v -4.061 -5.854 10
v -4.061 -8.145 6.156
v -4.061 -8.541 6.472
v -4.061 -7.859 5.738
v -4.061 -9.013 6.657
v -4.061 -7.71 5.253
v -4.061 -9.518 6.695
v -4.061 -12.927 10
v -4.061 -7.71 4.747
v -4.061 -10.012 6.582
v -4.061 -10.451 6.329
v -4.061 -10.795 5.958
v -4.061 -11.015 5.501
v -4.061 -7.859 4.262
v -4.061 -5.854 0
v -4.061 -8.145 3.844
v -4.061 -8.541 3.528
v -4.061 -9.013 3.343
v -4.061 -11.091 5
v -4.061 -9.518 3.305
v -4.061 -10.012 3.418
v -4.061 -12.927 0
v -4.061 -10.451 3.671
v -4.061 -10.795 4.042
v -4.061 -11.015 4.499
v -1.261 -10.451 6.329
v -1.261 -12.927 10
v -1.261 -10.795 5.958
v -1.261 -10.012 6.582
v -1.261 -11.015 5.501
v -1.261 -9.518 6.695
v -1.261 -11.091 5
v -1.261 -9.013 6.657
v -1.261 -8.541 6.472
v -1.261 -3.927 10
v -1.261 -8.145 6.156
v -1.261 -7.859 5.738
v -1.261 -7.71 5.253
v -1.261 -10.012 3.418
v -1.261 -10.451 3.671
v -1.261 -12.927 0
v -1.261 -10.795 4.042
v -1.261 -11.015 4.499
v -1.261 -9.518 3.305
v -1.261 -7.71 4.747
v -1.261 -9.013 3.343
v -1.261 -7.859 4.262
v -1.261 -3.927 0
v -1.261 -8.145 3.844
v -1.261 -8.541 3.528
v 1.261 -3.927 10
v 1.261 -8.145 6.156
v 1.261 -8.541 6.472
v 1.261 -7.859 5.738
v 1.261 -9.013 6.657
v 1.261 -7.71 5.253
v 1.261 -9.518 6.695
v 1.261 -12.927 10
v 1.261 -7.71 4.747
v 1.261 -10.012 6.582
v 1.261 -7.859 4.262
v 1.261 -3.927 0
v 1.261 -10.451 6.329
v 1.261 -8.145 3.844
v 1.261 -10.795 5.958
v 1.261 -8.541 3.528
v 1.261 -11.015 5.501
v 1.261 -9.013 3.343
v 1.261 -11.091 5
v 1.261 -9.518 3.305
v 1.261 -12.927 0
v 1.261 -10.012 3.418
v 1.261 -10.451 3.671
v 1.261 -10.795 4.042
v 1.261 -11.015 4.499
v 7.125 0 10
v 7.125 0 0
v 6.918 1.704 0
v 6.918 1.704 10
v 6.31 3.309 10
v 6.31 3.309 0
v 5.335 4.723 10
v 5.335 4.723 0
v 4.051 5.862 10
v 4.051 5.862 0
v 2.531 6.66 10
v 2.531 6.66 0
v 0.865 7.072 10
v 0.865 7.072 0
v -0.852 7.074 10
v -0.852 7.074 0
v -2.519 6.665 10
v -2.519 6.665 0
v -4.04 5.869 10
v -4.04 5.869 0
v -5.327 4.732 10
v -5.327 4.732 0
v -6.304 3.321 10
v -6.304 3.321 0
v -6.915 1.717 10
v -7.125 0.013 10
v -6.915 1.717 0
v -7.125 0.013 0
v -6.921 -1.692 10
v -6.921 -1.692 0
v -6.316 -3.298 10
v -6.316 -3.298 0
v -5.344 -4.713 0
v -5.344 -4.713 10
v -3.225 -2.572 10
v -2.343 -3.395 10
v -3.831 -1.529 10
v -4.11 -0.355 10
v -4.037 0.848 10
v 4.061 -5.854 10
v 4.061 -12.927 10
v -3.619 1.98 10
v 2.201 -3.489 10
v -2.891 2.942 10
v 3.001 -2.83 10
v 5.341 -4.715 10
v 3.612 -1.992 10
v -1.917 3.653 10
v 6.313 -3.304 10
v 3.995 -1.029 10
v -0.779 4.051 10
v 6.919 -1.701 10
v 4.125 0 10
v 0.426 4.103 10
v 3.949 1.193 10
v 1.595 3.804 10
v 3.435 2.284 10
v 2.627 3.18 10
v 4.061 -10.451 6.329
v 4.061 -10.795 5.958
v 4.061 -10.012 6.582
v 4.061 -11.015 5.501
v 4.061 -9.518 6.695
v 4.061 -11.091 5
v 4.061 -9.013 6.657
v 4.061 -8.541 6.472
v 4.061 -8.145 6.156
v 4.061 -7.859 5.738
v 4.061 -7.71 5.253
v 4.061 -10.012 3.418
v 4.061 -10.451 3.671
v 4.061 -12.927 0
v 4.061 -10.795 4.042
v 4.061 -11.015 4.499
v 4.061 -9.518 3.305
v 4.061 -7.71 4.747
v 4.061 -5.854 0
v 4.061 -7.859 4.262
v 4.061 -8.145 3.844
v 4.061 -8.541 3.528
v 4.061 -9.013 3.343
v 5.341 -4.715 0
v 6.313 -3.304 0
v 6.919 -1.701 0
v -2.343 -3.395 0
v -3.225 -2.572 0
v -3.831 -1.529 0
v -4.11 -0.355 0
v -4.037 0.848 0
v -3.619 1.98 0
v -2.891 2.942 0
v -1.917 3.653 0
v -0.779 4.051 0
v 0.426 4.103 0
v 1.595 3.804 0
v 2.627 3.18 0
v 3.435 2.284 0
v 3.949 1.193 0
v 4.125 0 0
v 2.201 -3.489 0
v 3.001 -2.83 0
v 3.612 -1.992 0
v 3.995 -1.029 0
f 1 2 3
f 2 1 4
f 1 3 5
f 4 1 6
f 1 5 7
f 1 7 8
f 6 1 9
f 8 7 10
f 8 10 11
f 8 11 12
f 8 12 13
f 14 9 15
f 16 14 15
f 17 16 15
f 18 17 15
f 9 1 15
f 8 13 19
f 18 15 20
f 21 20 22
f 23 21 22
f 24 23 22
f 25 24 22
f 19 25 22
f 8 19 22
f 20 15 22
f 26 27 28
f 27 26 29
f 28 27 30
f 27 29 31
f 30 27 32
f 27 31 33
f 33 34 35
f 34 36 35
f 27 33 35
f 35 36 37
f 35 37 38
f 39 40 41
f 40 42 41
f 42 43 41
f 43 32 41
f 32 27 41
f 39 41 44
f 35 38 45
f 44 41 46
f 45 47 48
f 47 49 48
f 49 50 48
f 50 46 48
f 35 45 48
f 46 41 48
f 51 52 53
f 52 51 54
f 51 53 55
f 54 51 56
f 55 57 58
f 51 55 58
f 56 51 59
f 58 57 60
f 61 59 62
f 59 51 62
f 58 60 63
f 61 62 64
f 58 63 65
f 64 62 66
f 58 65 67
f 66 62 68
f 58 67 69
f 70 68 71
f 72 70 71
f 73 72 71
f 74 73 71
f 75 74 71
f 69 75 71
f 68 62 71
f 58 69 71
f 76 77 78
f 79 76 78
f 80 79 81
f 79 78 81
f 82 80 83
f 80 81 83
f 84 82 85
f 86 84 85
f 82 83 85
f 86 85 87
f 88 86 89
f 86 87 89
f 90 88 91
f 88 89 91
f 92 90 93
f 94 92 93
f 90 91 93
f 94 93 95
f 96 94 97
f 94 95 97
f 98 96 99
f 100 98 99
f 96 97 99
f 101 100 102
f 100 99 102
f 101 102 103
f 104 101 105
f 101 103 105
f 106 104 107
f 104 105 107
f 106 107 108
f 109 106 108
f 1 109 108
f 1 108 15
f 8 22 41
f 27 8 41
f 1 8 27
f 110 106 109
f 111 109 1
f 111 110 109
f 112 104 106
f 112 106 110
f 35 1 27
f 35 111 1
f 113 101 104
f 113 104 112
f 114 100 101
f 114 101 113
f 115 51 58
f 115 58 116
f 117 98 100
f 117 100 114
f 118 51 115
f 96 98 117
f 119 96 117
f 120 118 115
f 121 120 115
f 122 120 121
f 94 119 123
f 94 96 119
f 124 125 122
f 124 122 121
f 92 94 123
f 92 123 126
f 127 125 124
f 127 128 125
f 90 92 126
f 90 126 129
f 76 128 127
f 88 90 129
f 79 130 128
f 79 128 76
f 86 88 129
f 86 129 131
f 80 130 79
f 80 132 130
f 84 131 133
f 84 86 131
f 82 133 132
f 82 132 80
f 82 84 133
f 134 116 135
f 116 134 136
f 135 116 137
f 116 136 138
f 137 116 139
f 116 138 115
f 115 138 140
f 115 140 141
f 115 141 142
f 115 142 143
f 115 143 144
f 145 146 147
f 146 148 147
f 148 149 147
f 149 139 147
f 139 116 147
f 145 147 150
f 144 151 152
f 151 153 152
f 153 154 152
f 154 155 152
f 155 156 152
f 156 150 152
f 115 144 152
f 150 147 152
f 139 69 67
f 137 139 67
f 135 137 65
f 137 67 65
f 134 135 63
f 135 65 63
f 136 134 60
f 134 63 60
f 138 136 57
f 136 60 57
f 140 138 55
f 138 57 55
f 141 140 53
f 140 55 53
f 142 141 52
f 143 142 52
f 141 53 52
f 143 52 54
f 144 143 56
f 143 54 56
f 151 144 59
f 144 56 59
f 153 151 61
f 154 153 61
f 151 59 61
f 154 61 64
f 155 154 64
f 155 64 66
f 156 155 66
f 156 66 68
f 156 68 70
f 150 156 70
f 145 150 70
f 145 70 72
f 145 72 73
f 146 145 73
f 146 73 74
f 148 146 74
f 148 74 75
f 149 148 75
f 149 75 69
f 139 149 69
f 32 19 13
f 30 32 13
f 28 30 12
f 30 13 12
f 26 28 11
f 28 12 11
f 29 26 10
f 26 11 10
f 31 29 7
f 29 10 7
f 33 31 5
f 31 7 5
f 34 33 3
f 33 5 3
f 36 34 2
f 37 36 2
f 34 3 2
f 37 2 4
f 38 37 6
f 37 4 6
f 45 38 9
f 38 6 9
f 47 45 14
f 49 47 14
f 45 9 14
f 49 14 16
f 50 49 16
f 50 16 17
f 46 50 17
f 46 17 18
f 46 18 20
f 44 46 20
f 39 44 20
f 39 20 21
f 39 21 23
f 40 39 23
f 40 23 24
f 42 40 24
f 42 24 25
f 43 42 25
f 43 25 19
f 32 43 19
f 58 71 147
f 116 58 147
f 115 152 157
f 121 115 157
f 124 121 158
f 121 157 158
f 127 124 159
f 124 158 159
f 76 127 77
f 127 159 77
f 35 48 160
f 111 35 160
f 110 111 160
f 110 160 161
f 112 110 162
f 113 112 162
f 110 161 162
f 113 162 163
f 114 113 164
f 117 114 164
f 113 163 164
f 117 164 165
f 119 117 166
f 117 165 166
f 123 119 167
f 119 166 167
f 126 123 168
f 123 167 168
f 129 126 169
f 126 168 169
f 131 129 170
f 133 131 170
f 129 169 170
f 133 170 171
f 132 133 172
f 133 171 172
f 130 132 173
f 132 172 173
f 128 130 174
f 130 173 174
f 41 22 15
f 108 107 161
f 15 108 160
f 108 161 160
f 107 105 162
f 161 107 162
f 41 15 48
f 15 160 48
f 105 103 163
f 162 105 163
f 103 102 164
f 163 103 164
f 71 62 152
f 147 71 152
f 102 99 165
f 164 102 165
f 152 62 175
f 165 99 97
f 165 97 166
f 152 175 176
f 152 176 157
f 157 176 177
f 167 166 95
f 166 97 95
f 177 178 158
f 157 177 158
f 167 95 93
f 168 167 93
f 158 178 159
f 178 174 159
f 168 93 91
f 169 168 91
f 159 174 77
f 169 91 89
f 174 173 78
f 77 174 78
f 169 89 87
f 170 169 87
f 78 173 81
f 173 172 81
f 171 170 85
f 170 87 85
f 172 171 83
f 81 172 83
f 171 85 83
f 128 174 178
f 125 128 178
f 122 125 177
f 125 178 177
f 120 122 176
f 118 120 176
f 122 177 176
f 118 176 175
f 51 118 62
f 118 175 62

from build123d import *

# Parameters (mm, degrees)
BOSS_EXTRUDE1_DEPTH = 10
SKETCH2_R           = 1.7
CUT_EXTRUDE1_DEPTH  = 20.805330599


with BuildPart() as part:
    # Sketch1 → Boss-Extrude1 (new body)
    with BuildSketch(Plane.XY):
        with BuildLine():
            Line((4.06124537, -3.927452752), (4.06124537, -5.854221643))
            ThreePointArc((4.06124537, -5.854221643), (6.312764777, -3.303729085), (7.125, 0))
            ThreePointArc((7.125, 0), (-3.303729085, 6.312764777), (-4.06124537, -5.854221643))
            Line((-4.06124537, -5.854221643), (-4.06124537, -3.927452752))
            Line((-4.06124537, -3.927452752), (-1.26124537, -3.927452752))
            ThreePointArc((-1.26124537, -3.927452752), (-2.430327946, 3.333036315), (4.125, 0))
            ThreePointArc((4.125, 0), (3.333036315, -2.430327946), (1.26124537, -3.927452752))
            Line((1.26124537, -3.927452752), (4.06124537, -3.927452752))
        make_face()
        with BuildLine():
            ThreePointArc((-4.06124537, -5.854221643), (-2.723530413, -6.583920343), (-1.26124537, -7.012480668))
            Line((-1.26124537, -7.012480668), (-1.26124537, -3.927452752))
            Line((-1.26124537, -3.927452752), (-4.06124537, -3.927452752))
            Line((-4.06124537, -3.927452752), (-4.06124537, -5.854221643))
        make_face()
        with BuildLine():
            Line((1.26124537, -3.927452752), (1.26124537, -7.012480668))
            ThreePointArc((1.26124537, -7.012480668), (2.723530413, -6.583920343), (4.06124537, -5.854221643))
            Line((4.06124537, -5.854221643), (4.06124537, -3.927452752))
            Line((4.06124537, -3.927452752), (1.26124537, -3.927452752))
        make_face()
        with BuildLine():
            Line((1.26124537, -7.012480668), (1.26124537, -12.927452752))
            Line((1.26124537, -12.927452752), (4.06124537, -12.927452752))
            Line((4.06124537, -12.927452752), (4.06124537, -5.854221643))
            ThreePointArc((4.06124537, -5.854221643), (2.723530413, -6.583920343), (1.26124537, -7.012480668))
        make_face()
        with BuildLine():
            Line((-1.26124537, -12.927452752), (-1.26124537, -7.012480668))
            ThreePointArc((-1.26124537, -7.012480668), (-2.723530413, -6.583920343), (-4.06124537, -5.854221643))
            Line((-4.06124537, -5.854221643), (-4.06124537, -12.927452752))
            Line((-4.06124537, -12.927452752), (-1.26124537, -12.927452752))
        make_face()
    extrude(amount=BOSS_EXTRUDE1_DEPTH)

    # Sketch2 → Cut-Extrude1 (cut, through all)
    with BuildSketch(Plane.ZY.offset(4.06124537)):
        with Locations(Location((5, -9.390837197, 0), (0, 0, 270))):
            Circle(SKETCH2_R)
    extrude(amount=-CUT_EXTRUDE1_DEPTH, mode=Mode.SUBTRACT)


solid = part.part
